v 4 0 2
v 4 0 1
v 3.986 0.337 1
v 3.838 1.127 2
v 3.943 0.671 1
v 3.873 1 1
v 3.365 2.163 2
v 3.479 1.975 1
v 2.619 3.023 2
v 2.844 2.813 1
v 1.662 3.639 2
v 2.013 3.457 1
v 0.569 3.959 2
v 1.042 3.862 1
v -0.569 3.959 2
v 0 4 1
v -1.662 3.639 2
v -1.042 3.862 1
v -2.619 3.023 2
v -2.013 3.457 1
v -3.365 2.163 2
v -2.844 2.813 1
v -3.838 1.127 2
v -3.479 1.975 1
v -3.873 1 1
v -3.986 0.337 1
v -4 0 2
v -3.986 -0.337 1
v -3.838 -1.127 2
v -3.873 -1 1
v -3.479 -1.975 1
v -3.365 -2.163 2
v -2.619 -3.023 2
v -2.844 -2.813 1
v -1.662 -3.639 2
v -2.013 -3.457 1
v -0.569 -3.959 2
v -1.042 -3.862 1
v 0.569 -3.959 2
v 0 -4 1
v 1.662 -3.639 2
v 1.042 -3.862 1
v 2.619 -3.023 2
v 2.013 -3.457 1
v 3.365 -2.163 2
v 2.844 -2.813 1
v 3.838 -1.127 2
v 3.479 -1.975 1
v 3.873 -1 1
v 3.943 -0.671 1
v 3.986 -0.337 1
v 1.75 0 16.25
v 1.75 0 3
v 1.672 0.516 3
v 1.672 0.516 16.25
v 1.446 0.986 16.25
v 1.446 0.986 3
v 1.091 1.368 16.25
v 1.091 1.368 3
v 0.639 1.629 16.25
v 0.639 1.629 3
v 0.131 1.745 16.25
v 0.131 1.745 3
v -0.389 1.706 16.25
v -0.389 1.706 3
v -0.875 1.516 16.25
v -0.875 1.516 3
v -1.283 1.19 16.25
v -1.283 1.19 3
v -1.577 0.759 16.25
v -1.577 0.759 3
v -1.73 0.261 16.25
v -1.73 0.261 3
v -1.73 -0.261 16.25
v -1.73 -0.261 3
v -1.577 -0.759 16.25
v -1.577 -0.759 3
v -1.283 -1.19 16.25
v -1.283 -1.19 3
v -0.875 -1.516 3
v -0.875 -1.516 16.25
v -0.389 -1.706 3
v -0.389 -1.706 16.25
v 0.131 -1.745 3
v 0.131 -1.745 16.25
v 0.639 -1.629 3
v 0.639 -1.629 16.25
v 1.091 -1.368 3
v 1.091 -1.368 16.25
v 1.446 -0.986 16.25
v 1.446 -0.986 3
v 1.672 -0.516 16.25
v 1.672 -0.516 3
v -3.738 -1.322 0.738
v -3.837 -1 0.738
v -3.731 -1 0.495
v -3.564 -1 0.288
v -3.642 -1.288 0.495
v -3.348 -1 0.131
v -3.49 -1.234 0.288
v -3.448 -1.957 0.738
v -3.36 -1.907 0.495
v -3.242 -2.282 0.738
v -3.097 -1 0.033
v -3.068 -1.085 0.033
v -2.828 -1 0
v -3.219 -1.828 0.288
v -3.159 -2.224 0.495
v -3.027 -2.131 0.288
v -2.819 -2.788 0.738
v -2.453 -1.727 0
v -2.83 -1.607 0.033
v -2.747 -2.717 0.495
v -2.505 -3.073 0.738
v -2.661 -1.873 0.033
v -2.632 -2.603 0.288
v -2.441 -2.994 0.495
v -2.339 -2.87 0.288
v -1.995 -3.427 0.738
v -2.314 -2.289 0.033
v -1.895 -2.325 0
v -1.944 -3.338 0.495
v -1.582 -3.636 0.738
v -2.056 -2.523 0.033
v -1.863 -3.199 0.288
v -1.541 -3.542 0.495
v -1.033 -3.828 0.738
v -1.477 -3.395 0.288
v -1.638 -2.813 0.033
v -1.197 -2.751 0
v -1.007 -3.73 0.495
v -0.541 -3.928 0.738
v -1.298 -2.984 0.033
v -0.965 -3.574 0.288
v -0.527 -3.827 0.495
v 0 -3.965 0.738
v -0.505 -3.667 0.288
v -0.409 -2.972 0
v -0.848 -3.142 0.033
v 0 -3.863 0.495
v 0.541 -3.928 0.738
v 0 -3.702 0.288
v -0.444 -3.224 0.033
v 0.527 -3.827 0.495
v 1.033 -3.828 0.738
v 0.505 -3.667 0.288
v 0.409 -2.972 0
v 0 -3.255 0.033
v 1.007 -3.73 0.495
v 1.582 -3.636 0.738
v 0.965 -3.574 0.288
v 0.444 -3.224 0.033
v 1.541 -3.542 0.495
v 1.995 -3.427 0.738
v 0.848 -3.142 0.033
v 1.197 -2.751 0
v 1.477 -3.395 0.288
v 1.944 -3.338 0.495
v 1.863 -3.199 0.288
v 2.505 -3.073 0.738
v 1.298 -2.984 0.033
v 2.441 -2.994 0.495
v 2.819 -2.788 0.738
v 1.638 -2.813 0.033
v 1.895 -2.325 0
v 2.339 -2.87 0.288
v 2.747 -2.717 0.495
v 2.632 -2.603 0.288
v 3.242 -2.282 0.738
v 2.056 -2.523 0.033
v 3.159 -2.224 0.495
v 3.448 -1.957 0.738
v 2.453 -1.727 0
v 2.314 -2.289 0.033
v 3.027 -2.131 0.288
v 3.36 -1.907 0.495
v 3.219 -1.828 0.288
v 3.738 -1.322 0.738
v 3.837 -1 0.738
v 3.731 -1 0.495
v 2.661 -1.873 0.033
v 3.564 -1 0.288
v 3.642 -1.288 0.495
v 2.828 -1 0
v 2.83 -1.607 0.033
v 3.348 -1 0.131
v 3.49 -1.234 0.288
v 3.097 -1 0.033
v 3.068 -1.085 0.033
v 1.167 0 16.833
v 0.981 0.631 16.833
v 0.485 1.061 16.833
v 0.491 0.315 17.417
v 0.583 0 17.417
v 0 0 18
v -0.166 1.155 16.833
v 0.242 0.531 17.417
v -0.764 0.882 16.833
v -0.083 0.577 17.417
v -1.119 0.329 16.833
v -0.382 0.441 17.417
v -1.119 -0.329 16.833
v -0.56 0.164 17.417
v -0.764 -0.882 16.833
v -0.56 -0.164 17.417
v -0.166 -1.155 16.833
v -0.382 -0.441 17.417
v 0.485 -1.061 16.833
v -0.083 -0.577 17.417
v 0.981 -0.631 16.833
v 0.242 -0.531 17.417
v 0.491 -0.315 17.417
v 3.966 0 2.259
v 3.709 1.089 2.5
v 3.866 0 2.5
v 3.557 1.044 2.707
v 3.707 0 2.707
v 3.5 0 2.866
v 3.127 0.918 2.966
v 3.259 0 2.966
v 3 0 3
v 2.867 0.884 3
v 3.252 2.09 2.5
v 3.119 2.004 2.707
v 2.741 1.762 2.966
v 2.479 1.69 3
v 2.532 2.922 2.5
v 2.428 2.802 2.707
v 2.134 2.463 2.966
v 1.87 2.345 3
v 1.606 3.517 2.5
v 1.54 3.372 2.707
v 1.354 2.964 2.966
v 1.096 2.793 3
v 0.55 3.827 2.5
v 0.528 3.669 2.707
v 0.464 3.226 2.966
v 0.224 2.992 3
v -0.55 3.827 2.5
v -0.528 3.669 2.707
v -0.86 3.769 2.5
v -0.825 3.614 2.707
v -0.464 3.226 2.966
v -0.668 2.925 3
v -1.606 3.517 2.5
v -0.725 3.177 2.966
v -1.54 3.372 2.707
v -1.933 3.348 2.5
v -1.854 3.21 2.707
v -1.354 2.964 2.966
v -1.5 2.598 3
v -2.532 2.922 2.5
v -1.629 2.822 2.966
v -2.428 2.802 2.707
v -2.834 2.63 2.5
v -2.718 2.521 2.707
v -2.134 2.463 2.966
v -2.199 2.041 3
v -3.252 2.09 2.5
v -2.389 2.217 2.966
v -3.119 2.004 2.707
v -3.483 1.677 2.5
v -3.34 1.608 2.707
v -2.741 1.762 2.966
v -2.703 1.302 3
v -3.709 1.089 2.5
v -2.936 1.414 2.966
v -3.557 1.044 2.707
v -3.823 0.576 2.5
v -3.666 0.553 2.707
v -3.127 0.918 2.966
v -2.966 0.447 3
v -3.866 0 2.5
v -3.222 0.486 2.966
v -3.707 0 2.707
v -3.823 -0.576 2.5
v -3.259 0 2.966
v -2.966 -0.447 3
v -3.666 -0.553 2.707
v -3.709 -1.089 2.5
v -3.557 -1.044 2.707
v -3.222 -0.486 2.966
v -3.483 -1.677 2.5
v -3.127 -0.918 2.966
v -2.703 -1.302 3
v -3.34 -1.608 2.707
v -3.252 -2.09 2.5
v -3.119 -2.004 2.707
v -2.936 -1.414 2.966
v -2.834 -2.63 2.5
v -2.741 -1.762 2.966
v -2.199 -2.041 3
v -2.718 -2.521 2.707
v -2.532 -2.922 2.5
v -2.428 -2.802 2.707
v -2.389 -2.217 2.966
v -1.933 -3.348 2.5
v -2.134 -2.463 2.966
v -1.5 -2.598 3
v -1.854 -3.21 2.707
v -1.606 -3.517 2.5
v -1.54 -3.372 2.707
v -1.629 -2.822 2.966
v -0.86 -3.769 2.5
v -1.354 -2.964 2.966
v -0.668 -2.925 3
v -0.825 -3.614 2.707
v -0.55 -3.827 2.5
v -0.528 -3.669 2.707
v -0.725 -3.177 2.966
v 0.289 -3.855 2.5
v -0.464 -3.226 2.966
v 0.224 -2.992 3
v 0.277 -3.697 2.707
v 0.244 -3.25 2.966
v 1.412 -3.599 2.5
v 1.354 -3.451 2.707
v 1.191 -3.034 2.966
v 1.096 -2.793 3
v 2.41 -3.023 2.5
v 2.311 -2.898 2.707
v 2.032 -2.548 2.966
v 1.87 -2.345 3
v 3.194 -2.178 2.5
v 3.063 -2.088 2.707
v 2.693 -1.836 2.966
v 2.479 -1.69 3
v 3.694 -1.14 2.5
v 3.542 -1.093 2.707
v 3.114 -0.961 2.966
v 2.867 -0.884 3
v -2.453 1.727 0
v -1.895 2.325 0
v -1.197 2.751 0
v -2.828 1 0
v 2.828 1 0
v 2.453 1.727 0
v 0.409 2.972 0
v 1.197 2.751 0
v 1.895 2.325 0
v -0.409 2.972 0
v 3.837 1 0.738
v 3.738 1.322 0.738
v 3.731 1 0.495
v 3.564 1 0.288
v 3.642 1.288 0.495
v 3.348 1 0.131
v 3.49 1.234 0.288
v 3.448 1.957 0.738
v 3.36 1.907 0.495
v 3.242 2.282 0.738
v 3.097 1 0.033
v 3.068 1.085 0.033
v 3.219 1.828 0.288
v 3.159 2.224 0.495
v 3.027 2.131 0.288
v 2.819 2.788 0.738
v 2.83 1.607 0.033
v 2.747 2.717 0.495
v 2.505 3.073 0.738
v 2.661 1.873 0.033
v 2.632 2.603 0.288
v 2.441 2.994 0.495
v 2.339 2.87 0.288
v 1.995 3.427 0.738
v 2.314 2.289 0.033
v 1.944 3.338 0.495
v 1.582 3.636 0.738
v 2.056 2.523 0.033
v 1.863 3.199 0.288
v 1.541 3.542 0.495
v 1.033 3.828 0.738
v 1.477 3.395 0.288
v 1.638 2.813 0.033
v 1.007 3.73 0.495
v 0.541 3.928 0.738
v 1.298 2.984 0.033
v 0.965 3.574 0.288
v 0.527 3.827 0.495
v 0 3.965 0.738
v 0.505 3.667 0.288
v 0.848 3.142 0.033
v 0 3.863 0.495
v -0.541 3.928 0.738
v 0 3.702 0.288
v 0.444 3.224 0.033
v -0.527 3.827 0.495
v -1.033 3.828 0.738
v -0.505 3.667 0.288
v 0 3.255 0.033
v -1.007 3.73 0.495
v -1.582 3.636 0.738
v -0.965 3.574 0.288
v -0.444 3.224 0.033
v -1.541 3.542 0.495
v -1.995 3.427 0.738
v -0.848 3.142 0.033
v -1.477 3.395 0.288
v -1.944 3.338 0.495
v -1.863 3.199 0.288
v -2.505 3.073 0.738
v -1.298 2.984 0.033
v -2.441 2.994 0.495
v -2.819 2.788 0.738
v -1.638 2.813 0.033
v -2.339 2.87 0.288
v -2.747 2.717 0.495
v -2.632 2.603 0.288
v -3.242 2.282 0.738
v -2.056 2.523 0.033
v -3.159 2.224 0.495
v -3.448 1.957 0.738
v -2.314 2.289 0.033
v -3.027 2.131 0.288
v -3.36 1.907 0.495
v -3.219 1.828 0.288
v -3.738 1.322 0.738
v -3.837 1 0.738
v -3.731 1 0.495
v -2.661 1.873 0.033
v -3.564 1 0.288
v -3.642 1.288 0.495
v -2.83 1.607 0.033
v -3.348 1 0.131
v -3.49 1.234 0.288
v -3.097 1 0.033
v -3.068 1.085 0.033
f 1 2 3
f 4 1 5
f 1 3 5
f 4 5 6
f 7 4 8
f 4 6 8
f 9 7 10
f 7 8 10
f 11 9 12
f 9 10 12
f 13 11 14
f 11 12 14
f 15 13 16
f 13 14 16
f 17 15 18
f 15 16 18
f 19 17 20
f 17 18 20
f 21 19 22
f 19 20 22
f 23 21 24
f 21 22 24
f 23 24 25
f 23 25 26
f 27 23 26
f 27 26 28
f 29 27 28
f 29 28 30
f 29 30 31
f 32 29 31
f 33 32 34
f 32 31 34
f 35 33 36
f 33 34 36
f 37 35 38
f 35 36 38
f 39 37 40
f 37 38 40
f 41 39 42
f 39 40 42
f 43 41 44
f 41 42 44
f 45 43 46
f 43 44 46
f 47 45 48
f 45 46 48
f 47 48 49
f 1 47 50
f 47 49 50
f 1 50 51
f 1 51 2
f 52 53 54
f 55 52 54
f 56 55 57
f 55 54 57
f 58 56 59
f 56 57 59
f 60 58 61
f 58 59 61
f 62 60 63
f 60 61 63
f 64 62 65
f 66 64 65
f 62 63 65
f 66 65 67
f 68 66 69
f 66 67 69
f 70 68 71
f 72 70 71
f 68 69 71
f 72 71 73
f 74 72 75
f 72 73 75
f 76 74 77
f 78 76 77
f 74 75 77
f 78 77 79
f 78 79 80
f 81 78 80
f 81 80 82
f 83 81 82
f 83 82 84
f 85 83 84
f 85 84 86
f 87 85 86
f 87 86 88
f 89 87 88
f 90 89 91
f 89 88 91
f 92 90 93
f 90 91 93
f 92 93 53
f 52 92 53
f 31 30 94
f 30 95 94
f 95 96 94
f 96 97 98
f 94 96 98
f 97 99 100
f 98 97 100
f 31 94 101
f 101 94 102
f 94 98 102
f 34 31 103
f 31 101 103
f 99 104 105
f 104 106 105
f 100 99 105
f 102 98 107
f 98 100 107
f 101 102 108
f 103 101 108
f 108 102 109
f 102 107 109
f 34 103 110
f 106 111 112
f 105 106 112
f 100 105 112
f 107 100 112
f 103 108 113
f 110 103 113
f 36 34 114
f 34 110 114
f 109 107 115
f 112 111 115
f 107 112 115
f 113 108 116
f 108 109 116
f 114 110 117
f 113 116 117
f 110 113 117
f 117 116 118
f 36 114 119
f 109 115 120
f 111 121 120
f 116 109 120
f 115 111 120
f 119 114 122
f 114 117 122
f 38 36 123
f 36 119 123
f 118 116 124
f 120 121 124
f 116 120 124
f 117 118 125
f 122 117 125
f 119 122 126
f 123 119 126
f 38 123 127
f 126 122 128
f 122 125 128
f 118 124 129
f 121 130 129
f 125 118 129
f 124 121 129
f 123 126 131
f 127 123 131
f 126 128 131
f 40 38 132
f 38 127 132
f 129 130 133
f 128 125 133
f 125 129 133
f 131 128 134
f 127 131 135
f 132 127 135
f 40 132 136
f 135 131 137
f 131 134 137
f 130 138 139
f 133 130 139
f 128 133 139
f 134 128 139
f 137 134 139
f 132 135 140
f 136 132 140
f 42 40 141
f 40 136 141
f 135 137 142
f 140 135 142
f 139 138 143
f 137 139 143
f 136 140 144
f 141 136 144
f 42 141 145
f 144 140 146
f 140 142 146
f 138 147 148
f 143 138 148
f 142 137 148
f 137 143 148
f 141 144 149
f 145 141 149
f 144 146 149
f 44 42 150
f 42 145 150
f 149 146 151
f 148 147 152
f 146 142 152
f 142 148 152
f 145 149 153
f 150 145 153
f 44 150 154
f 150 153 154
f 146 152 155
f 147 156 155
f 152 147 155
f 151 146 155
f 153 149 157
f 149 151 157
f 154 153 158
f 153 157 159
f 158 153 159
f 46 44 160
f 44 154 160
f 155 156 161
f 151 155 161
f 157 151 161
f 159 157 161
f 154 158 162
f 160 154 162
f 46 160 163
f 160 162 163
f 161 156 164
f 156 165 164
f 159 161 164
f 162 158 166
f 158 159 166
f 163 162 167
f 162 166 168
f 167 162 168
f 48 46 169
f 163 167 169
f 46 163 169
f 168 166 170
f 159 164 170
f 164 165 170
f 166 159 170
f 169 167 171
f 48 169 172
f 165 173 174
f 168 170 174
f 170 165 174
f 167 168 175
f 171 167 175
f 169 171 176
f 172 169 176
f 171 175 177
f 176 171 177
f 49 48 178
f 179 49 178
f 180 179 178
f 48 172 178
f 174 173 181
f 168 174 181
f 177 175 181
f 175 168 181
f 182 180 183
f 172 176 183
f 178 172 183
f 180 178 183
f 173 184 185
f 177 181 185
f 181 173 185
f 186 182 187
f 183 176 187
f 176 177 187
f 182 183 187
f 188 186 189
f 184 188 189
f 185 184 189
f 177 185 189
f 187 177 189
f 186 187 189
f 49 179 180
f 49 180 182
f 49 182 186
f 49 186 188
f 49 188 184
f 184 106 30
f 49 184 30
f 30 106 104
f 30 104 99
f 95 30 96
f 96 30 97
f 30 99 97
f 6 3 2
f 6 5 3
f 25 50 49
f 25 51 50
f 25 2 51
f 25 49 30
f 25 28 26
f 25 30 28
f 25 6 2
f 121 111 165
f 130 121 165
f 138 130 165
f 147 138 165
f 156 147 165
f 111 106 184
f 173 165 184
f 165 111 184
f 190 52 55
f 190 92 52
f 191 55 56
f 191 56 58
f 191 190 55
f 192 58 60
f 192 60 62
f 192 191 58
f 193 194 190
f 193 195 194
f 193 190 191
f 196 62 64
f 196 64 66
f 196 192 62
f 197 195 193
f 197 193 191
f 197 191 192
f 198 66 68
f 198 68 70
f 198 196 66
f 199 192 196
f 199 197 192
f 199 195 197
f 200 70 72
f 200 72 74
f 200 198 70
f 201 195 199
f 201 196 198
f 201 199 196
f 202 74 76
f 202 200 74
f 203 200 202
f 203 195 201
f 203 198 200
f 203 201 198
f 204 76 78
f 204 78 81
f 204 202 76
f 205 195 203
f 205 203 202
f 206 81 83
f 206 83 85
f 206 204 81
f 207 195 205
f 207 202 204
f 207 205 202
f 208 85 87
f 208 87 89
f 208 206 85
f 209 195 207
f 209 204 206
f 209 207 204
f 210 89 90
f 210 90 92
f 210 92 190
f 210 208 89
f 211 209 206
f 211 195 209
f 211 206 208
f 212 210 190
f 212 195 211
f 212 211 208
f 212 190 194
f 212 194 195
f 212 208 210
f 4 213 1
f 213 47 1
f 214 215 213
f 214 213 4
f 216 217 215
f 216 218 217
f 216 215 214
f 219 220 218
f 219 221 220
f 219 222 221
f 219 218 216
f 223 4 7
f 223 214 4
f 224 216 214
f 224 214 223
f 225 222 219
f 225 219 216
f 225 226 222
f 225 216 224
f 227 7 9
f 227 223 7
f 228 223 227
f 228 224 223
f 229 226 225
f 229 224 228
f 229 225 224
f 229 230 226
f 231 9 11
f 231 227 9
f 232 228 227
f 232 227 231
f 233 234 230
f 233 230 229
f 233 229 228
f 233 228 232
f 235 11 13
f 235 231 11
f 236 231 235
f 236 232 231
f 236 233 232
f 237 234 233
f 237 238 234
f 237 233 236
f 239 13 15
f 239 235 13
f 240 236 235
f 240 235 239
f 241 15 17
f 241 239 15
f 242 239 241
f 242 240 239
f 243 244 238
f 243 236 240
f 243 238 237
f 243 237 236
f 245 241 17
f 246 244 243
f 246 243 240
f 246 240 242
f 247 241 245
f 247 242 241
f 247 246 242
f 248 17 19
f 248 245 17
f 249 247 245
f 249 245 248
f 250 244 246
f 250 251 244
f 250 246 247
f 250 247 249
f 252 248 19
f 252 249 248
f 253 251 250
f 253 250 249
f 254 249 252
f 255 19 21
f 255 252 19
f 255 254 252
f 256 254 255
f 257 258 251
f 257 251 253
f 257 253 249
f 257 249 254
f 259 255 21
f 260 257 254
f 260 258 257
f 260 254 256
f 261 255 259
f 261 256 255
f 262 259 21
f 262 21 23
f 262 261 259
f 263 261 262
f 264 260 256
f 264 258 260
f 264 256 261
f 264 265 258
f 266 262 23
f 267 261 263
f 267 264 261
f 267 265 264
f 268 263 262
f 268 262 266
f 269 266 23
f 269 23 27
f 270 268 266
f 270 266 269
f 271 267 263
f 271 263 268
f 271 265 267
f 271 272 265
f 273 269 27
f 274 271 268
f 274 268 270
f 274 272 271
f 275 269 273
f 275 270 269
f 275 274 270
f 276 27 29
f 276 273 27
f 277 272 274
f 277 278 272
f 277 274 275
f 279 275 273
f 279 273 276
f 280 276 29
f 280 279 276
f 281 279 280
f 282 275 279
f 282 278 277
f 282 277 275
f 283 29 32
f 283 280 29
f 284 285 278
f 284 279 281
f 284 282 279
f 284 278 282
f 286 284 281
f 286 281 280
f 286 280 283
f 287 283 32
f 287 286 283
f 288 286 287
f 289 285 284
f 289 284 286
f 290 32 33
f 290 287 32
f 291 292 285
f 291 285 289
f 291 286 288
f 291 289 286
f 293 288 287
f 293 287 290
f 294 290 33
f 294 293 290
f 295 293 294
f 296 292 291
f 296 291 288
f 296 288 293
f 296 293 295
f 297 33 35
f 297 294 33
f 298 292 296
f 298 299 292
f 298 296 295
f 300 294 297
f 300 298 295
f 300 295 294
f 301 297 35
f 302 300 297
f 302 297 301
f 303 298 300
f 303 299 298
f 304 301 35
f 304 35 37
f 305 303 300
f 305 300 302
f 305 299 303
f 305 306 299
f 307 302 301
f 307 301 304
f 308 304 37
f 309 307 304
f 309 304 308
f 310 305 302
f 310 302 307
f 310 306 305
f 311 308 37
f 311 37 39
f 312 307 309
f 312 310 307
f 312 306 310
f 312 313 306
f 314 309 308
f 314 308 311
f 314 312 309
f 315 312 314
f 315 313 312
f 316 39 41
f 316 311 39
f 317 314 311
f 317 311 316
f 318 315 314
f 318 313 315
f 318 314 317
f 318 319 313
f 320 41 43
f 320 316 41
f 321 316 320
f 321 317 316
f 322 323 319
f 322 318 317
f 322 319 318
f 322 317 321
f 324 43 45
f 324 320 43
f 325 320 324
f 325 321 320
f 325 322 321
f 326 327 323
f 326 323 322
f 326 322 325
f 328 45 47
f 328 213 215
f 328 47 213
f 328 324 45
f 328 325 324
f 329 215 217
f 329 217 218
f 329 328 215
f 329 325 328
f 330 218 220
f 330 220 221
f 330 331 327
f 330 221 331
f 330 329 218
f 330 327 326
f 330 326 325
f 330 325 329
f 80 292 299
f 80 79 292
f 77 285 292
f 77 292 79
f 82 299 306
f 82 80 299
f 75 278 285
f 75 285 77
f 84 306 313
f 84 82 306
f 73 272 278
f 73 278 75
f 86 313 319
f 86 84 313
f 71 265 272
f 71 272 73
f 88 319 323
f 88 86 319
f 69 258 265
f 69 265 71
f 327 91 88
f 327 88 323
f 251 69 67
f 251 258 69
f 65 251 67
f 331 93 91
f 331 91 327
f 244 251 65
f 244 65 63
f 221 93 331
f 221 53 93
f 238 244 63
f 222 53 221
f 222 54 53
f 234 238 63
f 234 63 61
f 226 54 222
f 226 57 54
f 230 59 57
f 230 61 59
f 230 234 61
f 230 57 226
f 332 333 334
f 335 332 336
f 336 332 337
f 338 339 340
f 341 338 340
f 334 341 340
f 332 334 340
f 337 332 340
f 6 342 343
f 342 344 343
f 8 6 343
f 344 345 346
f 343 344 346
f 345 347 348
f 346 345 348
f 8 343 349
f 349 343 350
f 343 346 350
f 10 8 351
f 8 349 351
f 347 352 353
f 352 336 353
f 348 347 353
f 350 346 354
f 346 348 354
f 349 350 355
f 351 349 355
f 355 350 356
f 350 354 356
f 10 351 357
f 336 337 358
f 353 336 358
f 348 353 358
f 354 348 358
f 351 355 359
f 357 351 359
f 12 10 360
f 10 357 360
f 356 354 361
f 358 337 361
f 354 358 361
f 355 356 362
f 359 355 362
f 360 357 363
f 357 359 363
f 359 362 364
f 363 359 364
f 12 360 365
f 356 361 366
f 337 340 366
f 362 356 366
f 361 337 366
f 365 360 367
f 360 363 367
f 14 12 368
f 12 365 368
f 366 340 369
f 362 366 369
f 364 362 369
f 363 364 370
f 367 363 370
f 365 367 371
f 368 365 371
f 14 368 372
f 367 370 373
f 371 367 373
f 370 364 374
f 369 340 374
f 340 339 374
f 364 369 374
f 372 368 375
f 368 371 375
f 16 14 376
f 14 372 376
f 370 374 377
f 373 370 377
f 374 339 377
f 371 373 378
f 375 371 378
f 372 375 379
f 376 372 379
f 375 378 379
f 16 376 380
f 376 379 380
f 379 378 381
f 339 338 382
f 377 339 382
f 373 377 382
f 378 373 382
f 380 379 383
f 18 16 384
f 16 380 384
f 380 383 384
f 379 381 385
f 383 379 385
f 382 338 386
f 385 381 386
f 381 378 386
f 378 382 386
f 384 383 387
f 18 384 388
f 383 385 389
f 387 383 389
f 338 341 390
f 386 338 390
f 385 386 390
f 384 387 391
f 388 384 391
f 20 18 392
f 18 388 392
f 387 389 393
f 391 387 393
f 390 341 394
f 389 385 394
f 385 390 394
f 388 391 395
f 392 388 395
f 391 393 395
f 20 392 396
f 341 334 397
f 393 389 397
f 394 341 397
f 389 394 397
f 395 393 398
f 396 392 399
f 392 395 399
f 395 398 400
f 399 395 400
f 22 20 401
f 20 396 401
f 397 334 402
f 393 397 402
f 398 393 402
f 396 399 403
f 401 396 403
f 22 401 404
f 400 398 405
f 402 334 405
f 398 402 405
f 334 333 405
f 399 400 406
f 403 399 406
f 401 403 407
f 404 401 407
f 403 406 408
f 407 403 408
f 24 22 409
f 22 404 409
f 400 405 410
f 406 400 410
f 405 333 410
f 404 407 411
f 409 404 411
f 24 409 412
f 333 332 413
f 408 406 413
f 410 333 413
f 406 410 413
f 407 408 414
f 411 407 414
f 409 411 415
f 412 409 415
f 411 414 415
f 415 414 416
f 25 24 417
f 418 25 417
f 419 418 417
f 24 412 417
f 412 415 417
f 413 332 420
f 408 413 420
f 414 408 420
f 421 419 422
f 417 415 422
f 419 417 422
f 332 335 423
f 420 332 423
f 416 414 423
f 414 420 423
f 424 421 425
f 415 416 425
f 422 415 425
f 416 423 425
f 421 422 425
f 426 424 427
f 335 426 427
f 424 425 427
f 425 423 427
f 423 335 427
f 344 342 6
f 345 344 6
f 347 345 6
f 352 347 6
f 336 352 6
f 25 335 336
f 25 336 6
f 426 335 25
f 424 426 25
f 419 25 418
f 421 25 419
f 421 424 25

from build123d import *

# Parameters (mm, degrees)
SKETCH1_R           = 4
BOSS_EXTRUDE1_DEPTH = 3
SKETCH2_R           = 1.75
BOSS_EXTRUDE2_DEPTH = 15
FILLET2_R           = 1
SKETCH3_W           = 11.938810874
SKETCH3_H           = 2
CUT_EXTRUDE1_DEPTH  = 1
CHAMFER1_SIZE       = 1.75


with BuildPart() as part:
    # Sketch1 → Boss-Extrude1 (new body)
    with BuildSketch(Plane.XY):
        Circle(SKETCH1_R)
    extrude(amount=BOSS_EXTRUDE1_DEPTH)

    # Sketch2 → Boss-Extrude2 (add)
    with BuildSketch(Plane.XY.offset(3)):
        Circle(SKETCH2_R)
    extrude(amount=BOSS_EXTRUDE2_DEPTH)

    # Fillet2
    fillet2_edges = [part.edges().sort_by_distance(p)[0] for p in [
        (-4, 0, 0),
        (-4, 0, 3),
    ]]
    fillet(fillet2_edges, radius=FILLET2_R)

    # Sketch3 → Cut-Extrude1 (cut)
    with BuildSketch(Plane(origin=(0, 0, 0), x_dir=(-1, 0, 0), z_dir=(0, 0, -1))):
        with Locations((-0.202329925, 0)):
            Rectangle(SKETCH3_W, SKETCH3_H)
    extrude(amount=-CUT_EXTRUDE1_DEPTH, mode=Mode.SUBTRACT)

    # Chamfer1
    chamfer1_edges = [part.edges().sort_by_distance(p)[0] for p in [
        (-1.75, 0, 18),
    ]]
    chamfer(chamfer1_edges, length=CHAMFER1_SIZE)


solid = part.part
